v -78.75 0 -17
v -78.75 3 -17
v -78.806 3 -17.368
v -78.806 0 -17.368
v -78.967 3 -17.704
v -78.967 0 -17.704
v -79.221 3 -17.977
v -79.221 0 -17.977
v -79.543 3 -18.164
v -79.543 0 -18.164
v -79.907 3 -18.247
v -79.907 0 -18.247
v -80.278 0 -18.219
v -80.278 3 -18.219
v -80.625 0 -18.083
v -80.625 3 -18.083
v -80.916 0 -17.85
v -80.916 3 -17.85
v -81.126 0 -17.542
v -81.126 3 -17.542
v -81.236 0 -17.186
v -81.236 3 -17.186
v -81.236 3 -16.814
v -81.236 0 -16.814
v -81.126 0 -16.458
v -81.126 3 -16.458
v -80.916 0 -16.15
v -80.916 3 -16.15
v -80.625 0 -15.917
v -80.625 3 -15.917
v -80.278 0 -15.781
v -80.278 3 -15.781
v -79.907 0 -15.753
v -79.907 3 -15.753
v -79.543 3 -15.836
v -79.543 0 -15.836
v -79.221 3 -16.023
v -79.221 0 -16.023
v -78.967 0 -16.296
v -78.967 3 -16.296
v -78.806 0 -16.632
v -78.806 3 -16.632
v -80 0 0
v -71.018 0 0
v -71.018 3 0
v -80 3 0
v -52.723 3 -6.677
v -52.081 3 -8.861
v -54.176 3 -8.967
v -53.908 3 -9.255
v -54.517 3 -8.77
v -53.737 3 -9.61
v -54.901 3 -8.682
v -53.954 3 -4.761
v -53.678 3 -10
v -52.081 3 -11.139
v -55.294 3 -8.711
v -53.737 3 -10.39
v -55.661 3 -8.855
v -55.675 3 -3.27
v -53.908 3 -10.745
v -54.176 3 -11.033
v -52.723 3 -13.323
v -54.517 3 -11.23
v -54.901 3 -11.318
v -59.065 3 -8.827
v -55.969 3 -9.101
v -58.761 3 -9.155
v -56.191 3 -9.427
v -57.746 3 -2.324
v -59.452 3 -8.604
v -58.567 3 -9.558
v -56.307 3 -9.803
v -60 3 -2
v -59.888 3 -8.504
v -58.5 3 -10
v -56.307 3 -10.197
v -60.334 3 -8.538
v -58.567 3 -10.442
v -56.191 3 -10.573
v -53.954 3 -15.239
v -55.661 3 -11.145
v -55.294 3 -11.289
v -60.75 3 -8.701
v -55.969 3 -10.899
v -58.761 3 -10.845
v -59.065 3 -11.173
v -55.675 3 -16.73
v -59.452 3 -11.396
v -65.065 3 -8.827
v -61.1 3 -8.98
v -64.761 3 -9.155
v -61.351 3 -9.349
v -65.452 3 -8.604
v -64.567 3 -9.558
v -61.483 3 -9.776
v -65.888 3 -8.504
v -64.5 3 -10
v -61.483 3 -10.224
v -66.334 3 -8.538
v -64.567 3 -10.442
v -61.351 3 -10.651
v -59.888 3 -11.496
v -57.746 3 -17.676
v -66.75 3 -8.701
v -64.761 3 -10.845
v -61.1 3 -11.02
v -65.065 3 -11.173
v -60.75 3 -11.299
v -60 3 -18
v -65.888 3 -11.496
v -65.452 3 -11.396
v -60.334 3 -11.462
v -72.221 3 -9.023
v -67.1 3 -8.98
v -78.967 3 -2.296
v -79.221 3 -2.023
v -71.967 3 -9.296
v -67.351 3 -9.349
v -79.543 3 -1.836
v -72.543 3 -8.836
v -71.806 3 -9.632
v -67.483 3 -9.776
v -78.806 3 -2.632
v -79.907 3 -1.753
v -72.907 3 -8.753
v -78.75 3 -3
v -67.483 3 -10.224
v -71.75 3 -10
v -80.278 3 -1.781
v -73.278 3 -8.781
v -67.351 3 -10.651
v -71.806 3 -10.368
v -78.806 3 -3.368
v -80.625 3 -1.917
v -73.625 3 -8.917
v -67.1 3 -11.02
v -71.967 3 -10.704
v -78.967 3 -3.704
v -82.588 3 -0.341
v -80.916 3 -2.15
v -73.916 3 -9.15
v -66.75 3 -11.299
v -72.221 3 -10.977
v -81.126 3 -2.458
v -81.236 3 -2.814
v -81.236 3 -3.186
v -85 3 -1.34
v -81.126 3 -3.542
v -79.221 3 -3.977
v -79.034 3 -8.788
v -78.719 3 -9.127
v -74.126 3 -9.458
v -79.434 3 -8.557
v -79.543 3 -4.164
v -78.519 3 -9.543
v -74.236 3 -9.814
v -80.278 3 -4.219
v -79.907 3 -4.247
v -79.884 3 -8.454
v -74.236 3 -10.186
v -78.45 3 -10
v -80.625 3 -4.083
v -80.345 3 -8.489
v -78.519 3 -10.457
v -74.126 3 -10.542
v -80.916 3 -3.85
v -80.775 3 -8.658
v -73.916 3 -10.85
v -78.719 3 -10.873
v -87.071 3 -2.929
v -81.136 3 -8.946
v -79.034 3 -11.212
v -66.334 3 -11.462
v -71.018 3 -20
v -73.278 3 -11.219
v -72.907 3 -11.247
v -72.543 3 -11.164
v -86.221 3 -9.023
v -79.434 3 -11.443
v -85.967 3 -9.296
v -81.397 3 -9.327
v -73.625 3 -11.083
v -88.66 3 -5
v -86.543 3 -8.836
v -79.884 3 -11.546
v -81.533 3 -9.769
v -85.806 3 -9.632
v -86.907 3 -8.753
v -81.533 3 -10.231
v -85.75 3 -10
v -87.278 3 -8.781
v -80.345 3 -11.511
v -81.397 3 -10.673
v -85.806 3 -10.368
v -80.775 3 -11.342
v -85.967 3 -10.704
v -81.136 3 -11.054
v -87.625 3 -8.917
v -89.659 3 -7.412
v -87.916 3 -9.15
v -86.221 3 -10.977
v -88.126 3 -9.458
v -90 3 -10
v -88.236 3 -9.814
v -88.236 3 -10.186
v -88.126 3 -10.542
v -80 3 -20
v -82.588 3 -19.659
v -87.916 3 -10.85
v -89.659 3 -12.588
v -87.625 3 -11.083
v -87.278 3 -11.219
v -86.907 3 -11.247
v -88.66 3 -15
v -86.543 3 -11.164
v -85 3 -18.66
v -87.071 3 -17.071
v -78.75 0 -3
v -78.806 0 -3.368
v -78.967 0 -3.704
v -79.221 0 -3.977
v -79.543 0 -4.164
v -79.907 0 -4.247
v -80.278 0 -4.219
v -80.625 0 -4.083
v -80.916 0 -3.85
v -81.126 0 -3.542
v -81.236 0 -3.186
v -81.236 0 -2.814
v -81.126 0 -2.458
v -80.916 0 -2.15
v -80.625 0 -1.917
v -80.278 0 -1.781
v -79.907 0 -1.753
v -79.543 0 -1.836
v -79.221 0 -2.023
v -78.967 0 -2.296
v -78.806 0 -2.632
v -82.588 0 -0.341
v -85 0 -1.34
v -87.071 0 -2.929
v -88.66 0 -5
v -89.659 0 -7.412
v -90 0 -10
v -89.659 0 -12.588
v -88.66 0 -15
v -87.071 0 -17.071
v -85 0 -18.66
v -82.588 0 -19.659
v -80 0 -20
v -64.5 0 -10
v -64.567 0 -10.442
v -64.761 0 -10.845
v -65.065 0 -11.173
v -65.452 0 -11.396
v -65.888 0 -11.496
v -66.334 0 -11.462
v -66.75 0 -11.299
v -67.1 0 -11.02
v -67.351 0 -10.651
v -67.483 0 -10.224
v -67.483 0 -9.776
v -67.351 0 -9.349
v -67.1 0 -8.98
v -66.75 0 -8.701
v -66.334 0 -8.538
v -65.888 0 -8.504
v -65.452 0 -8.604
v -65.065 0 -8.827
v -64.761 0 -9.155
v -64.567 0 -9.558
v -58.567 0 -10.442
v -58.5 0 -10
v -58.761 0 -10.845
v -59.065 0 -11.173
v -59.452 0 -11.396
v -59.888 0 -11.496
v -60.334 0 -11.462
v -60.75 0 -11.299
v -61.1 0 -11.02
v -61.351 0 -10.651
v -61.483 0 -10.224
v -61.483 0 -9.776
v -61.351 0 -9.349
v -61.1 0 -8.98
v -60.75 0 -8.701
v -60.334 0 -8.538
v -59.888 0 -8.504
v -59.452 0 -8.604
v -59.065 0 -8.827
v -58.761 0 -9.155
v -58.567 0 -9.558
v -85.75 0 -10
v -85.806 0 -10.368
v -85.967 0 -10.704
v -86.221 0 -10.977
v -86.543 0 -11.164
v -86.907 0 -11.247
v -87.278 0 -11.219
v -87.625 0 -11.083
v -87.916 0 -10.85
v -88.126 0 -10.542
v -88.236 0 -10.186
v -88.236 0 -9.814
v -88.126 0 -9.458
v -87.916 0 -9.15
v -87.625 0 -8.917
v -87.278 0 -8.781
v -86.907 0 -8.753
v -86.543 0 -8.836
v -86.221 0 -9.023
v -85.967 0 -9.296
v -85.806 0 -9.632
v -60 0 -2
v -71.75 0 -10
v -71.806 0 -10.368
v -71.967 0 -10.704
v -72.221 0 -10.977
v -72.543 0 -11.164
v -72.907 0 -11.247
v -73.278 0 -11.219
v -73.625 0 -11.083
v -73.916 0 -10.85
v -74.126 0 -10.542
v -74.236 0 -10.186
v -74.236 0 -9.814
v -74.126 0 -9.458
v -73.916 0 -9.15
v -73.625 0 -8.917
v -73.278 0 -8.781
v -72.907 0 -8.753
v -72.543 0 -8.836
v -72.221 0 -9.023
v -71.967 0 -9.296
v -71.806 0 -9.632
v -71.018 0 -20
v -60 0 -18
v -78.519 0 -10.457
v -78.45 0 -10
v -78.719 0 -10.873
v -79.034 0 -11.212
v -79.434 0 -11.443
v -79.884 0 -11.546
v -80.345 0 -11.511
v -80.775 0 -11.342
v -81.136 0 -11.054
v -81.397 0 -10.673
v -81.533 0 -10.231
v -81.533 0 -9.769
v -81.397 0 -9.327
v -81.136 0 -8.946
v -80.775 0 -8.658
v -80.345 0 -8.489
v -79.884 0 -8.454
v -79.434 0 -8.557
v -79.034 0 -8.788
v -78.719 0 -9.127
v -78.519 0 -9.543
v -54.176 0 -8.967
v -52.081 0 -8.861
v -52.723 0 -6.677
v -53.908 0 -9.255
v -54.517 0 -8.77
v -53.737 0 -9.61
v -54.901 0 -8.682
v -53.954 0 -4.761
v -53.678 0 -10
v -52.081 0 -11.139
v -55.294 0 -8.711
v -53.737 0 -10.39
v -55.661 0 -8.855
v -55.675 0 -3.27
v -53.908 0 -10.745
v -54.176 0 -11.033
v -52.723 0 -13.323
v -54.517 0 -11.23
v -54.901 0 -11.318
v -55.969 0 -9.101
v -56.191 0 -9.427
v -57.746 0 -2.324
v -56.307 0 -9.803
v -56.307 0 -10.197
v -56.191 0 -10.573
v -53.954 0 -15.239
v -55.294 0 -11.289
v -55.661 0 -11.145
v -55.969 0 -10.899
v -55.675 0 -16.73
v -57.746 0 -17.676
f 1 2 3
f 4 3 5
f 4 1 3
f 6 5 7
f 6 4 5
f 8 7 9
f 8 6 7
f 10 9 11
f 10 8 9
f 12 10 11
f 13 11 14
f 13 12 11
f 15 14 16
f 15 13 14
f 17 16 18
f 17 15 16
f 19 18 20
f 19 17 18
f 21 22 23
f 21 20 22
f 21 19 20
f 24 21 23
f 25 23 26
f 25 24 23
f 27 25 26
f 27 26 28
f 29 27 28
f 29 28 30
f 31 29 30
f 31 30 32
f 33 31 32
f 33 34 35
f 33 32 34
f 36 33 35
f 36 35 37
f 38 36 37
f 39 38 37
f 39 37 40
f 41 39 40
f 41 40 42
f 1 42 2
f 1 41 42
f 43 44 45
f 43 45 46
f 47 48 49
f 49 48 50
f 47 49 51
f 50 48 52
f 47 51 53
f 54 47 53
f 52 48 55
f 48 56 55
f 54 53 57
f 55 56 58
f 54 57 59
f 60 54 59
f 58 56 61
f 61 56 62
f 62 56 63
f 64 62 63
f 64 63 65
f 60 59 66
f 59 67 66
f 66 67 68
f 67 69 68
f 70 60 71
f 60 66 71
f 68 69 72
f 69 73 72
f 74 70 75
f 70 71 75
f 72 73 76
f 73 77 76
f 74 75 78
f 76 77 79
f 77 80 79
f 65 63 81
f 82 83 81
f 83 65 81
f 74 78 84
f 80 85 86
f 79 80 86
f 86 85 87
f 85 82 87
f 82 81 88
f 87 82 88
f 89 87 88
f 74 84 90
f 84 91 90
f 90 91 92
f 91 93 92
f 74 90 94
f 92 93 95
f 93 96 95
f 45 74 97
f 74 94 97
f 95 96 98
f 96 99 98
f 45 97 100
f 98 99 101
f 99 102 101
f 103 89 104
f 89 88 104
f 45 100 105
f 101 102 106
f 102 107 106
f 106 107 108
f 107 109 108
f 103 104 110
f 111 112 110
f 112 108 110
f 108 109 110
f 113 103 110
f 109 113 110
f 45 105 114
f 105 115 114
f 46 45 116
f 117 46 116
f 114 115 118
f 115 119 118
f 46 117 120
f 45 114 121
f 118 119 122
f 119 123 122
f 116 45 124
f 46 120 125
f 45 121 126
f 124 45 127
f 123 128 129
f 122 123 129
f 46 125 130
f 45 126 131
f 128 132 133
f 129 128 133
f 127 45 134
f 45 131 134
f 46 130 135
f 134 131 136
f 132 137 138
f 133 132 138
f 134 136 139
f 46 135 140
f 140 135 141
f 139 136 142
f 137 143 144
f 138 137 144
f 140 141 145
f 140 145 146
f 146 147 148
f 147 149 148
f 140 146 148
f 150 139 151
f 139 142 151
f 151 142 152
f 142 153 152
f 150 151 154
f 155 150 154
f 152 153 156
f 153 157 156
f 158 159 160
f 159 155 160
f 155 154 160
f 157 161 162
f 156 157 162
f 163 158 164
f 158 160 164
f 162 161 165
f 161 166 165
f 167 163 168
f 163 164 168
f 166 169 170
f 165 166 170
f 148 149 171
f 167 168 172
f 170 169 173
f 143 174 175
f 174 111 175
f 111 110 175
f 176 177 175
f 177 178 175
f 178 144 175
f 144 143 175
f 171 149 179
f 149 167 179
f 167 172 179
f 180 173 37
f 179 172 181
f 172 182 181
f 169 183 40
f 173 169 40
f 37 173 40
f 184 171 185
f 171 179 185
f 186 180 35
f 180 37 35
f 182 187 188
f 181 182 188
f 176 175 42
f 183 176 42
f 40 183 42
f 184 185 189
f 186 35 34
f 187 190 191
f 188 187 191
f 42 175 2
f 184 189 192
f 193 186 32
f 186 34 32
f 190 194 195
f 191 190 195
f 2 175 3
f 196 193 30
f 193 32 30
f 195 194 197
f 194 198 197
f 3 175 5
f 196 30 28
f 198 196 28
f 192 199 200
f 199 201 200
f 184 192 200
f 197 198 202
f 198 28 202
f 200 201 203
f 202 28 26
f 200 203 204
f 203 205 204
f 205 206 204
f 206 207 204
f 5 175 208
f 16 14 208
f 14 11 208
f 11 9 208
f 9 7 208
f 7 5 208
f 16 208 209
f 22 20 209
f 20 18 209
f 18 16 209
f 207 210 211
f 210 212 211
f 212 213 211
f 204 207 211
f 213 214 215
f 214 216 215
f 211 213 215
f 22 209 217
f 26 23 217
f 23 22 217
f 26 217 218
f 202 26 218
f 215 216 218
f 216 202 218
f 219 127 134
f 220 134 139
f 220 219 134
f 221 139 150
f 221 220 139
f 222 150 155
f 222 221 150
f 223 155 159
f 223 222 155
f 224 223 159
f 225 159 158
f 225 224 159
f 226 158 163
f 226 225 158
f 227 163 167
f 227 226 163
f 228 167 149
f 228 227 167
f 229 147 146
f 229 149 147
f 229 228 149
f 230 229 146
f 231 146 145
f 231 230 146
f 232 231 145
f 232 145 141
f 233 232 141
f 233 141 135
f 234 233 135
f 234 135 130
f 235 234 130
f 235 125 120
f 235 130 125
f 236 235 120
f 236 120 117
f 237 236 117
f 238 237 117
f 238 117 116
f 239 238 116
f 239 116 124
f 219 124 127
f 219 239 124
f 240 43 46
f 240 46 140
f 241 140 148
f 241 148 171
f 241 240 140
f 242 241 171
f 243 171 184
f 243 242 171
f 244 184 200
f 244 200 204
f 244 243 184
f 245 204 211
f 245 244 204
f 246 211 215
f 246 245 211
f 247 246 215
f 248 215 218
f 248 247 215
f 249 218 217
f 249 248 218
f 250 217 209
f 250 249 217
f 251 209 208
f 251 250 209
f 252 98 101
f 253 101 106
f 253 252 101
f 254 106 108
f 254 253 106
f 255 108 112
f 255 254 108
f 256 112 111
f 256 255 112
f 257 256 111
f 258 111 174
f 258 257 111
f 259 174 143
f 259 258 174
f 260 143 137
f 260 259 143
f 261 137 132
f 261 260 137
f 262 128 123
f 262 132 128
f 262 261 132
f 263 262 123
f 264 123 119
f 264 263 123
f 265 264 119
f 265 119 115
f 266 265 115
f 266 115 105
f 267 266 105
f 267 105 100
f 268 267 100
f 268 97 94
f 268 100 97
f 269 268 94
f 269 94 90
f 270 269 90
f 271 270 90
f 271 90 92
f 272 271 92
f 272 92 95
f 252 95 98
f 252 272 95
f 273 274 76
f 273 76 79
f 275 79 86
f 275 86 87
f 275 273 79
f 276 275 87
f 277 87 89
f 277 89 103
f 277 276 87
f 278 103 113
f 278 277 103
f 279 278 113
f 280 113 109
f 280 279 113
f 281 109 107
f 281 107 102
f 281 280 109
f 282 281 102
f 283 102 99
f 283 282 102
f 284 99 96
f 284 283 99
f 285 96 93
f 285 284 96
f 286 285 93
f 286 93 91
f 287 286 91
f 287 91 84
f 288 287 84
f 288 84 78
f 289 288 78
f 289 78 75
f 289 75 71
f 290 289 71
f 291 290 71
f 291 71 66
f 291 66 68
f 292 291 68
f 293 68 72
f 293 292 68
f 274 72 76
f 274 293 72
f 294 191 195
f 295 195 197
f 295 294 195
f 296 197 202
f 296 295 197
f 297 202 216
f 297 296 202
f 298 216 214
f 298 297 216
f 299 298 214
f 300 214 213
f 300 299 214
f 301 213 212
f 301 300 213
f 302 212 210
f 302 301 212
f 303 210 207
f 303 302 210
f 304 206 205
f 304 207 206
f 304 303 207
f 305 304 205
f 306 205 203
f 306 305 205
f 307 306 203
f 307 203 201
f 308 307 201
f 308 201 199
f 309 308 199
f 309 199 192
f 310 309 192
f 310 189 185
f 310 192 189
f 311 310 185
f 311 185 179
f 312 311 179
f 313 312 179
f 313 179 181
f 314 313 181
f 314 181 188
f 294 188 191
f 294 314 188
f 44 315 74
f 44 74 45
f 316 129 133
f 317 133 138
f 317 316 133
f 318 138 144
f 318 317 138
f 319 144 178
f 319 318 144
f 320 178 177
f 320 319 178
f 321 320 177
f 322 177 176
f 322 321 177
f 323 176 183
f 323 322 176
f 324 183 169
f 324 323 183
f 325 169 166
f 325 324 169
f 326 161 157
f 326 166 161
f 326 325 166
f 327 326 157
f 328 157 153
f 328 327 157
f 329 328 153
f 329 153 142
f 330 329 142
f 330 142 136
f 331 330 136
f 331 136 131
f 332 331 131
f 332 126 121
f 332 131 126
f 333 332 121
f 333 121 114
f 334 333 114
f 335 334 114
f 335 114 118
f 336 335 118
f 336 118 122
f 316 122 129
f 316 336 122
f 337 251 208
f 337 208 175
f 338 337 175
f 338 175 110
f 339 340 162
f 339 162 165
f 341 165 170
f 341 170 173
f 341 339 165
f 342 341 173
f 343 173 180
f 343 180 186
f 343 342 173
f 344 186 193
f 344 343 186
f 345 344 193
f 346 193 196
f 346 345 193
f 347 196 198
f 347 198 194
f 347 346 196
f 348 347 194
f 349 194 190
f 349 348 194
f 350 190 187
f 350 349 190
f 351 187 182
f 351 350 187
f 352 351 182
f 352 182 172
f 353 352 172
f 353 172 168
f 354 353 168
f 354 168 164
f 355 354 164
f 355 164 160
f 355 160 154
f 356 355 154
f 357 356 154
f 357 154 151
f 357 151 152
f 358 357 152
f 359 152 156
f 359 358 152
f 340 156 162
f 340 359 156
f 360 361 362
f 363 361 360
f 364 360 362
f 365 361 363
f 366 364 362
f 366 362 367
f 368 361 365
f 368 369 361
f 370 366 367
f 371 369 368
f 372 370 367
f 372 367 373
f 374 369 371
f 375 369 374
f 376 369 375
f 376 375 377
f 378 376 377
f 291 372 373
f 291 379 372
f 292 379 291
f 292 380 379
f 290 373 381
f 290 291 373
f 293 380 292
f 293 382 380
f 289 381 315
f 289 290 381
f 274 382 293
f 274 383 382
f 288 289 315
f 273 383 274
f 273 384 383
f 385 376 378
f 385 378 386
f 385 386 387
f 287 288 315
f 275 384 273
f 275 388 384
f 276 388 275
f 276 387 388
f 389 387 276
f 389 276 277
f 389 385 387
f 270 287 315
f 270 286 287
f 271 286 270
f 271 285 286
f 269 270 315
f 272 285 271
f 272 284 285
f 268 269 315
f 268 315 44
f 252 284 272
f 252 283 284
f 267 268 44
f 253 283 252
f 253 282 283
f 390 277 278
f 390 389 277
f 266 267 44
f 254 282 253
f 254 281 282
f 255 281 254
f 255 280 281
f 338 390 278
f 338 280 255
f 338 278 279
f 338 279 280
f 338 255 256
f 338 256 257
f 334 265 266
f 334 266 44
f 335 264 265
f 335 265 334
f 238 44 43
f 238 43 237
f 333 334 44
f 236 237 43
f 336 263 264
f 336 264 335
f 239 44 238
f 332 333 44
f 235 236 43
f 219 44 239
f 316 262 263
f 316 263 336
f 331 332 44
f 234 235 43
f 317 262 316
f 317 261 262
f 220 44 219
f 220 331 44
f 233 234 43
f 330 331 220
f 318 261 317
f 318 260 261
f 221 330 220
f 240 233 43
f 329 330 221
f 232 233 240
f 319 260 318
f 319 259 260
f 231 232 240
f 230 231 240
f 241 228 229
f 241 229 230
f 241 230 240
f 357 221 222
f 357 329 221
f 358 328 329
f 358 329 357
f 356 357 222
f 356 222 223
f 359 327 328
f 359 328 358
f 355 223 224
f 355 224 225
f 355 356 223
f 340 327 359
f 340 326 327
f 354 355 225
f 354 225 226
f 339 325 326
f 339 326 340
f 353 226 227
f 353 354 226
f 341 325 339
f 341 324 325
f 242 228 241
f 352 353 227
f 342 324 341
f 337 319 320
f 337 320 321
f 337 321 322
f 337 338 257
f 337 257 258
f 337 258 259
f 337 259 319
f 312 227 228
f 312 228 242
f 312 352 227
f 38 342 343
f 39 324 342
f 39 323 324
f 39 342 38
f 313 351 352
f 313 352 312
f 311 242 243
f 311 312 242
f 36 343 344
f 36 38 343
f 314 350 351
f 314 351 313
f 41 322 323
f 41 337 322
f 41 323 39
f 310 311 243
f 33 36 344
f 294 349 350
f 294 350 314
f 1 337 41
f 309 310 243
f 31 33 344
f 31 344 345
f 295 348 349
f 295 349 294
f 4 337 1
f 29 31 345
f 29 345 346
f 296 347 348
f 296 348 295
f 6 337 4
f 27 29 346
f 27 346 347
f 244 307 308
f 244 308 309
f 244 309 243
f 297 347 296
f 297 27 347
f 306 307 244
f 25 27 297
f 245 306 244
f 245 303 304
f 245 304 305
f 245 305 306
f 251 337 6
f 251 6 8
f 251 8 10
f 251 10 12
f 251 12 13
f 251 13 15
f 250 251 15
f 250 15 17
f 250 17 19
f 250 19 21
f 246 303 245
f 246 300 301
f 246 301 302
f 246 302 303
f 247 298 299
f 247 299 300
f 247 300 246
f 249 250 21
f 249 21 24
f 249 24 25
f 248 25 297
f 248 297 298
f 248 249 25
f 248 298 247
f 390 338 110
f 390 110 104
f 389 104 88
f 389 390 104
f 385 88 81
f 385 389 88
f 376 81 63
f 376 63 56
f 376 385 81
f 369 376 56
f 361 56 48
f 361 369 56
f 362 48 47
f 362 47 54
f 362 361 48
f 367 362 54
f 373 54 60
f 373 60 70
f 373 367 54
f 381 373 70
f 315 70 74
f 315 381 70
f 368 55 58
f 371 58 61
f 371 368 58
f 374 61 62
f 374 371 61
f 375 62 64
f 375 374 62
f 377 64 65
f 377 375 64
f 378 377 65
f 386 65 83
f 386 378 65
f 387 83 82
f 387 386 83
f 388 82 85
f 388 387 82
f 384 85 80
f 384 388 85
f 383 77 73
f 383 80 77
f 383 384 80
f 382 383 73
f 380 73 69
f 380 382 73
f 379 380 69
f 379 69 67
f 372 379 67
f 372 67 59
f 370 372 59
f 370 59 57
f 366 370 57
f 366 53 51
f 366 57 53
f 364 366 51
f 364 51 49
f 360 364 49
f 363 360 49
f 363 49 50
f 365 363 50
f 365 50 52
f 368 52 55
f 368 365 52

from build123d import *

# Parameters (mm, degrees)
SKETCH2_R           = 1.55
SKETCH2_R_2         = 1.5
BOSS_EXTRUDE2_DEPTH = 3
SKETCH3_R           = 1.25
SKETCH3_R_2         = 1.5
SKETCH3_R_3         = 1.321701339
CUT_EXTRUDE1_DEPTH  = 10


with BuildPart() as part:
    # Sketch2 → Boss-Extrude2 (new body)
    with BuildSketch(Plane(origin=(0, 0, 0), x_dir=(1, 0, 0), z_dir=(0, 1, 0))):
        with BuildLine():
            Line((-80, 0), (-71.018028778, 0))
            Line((-71.018028778, 0), (-60, 2))
            ThreePointArc((-60, 2), (-52, 10), (-60, 18))
            Line((-60, 18), (-71.018028778, 20))
            Line((-71.018028778, 20), (-80, 20))
            ThreePointArc((-80, 20), (-90, 10), (-80, 0))
        make_face()
        with Locations((-80, 10)):
            Circle(SKETCH2_R, mode=Mode.SUBTRACT)
        with Locations((-60, 10)):
            Circle(SKETCH2_R_2, mode=Mode.SUBTRACT)
    extrude(amount=BOSS_EXTRUDE2_DEPTH)

    # Sketch3 → Cut-Extrude1 (cut)
    with BuildSketch(Plane(origin=(0, 0, 0), x_dir=(1, 0, 0), z_dir=(0, 1, 0))):
        with Locations((-80, 17)):
            Circle(SKETCH3_R)
        with Locations((-80, 3)):
            Circle(SKETCH3_R)
        with Locations((-87, 10)):
            Circle(SKETCH3_R)
        with Locations((-73, 10)):
            Circle(SKETCH3_R)
        with Locations((-66, 10)):
            Circle(SKETCH3_R_2)
        with Locations((-55, 10)):
            Circle(SKETCH3_R_3)
    extrude(amount=CUT_EXTRUDE1_DEPTH, mode=Mode.SUBTRACT)


solid = part.part
